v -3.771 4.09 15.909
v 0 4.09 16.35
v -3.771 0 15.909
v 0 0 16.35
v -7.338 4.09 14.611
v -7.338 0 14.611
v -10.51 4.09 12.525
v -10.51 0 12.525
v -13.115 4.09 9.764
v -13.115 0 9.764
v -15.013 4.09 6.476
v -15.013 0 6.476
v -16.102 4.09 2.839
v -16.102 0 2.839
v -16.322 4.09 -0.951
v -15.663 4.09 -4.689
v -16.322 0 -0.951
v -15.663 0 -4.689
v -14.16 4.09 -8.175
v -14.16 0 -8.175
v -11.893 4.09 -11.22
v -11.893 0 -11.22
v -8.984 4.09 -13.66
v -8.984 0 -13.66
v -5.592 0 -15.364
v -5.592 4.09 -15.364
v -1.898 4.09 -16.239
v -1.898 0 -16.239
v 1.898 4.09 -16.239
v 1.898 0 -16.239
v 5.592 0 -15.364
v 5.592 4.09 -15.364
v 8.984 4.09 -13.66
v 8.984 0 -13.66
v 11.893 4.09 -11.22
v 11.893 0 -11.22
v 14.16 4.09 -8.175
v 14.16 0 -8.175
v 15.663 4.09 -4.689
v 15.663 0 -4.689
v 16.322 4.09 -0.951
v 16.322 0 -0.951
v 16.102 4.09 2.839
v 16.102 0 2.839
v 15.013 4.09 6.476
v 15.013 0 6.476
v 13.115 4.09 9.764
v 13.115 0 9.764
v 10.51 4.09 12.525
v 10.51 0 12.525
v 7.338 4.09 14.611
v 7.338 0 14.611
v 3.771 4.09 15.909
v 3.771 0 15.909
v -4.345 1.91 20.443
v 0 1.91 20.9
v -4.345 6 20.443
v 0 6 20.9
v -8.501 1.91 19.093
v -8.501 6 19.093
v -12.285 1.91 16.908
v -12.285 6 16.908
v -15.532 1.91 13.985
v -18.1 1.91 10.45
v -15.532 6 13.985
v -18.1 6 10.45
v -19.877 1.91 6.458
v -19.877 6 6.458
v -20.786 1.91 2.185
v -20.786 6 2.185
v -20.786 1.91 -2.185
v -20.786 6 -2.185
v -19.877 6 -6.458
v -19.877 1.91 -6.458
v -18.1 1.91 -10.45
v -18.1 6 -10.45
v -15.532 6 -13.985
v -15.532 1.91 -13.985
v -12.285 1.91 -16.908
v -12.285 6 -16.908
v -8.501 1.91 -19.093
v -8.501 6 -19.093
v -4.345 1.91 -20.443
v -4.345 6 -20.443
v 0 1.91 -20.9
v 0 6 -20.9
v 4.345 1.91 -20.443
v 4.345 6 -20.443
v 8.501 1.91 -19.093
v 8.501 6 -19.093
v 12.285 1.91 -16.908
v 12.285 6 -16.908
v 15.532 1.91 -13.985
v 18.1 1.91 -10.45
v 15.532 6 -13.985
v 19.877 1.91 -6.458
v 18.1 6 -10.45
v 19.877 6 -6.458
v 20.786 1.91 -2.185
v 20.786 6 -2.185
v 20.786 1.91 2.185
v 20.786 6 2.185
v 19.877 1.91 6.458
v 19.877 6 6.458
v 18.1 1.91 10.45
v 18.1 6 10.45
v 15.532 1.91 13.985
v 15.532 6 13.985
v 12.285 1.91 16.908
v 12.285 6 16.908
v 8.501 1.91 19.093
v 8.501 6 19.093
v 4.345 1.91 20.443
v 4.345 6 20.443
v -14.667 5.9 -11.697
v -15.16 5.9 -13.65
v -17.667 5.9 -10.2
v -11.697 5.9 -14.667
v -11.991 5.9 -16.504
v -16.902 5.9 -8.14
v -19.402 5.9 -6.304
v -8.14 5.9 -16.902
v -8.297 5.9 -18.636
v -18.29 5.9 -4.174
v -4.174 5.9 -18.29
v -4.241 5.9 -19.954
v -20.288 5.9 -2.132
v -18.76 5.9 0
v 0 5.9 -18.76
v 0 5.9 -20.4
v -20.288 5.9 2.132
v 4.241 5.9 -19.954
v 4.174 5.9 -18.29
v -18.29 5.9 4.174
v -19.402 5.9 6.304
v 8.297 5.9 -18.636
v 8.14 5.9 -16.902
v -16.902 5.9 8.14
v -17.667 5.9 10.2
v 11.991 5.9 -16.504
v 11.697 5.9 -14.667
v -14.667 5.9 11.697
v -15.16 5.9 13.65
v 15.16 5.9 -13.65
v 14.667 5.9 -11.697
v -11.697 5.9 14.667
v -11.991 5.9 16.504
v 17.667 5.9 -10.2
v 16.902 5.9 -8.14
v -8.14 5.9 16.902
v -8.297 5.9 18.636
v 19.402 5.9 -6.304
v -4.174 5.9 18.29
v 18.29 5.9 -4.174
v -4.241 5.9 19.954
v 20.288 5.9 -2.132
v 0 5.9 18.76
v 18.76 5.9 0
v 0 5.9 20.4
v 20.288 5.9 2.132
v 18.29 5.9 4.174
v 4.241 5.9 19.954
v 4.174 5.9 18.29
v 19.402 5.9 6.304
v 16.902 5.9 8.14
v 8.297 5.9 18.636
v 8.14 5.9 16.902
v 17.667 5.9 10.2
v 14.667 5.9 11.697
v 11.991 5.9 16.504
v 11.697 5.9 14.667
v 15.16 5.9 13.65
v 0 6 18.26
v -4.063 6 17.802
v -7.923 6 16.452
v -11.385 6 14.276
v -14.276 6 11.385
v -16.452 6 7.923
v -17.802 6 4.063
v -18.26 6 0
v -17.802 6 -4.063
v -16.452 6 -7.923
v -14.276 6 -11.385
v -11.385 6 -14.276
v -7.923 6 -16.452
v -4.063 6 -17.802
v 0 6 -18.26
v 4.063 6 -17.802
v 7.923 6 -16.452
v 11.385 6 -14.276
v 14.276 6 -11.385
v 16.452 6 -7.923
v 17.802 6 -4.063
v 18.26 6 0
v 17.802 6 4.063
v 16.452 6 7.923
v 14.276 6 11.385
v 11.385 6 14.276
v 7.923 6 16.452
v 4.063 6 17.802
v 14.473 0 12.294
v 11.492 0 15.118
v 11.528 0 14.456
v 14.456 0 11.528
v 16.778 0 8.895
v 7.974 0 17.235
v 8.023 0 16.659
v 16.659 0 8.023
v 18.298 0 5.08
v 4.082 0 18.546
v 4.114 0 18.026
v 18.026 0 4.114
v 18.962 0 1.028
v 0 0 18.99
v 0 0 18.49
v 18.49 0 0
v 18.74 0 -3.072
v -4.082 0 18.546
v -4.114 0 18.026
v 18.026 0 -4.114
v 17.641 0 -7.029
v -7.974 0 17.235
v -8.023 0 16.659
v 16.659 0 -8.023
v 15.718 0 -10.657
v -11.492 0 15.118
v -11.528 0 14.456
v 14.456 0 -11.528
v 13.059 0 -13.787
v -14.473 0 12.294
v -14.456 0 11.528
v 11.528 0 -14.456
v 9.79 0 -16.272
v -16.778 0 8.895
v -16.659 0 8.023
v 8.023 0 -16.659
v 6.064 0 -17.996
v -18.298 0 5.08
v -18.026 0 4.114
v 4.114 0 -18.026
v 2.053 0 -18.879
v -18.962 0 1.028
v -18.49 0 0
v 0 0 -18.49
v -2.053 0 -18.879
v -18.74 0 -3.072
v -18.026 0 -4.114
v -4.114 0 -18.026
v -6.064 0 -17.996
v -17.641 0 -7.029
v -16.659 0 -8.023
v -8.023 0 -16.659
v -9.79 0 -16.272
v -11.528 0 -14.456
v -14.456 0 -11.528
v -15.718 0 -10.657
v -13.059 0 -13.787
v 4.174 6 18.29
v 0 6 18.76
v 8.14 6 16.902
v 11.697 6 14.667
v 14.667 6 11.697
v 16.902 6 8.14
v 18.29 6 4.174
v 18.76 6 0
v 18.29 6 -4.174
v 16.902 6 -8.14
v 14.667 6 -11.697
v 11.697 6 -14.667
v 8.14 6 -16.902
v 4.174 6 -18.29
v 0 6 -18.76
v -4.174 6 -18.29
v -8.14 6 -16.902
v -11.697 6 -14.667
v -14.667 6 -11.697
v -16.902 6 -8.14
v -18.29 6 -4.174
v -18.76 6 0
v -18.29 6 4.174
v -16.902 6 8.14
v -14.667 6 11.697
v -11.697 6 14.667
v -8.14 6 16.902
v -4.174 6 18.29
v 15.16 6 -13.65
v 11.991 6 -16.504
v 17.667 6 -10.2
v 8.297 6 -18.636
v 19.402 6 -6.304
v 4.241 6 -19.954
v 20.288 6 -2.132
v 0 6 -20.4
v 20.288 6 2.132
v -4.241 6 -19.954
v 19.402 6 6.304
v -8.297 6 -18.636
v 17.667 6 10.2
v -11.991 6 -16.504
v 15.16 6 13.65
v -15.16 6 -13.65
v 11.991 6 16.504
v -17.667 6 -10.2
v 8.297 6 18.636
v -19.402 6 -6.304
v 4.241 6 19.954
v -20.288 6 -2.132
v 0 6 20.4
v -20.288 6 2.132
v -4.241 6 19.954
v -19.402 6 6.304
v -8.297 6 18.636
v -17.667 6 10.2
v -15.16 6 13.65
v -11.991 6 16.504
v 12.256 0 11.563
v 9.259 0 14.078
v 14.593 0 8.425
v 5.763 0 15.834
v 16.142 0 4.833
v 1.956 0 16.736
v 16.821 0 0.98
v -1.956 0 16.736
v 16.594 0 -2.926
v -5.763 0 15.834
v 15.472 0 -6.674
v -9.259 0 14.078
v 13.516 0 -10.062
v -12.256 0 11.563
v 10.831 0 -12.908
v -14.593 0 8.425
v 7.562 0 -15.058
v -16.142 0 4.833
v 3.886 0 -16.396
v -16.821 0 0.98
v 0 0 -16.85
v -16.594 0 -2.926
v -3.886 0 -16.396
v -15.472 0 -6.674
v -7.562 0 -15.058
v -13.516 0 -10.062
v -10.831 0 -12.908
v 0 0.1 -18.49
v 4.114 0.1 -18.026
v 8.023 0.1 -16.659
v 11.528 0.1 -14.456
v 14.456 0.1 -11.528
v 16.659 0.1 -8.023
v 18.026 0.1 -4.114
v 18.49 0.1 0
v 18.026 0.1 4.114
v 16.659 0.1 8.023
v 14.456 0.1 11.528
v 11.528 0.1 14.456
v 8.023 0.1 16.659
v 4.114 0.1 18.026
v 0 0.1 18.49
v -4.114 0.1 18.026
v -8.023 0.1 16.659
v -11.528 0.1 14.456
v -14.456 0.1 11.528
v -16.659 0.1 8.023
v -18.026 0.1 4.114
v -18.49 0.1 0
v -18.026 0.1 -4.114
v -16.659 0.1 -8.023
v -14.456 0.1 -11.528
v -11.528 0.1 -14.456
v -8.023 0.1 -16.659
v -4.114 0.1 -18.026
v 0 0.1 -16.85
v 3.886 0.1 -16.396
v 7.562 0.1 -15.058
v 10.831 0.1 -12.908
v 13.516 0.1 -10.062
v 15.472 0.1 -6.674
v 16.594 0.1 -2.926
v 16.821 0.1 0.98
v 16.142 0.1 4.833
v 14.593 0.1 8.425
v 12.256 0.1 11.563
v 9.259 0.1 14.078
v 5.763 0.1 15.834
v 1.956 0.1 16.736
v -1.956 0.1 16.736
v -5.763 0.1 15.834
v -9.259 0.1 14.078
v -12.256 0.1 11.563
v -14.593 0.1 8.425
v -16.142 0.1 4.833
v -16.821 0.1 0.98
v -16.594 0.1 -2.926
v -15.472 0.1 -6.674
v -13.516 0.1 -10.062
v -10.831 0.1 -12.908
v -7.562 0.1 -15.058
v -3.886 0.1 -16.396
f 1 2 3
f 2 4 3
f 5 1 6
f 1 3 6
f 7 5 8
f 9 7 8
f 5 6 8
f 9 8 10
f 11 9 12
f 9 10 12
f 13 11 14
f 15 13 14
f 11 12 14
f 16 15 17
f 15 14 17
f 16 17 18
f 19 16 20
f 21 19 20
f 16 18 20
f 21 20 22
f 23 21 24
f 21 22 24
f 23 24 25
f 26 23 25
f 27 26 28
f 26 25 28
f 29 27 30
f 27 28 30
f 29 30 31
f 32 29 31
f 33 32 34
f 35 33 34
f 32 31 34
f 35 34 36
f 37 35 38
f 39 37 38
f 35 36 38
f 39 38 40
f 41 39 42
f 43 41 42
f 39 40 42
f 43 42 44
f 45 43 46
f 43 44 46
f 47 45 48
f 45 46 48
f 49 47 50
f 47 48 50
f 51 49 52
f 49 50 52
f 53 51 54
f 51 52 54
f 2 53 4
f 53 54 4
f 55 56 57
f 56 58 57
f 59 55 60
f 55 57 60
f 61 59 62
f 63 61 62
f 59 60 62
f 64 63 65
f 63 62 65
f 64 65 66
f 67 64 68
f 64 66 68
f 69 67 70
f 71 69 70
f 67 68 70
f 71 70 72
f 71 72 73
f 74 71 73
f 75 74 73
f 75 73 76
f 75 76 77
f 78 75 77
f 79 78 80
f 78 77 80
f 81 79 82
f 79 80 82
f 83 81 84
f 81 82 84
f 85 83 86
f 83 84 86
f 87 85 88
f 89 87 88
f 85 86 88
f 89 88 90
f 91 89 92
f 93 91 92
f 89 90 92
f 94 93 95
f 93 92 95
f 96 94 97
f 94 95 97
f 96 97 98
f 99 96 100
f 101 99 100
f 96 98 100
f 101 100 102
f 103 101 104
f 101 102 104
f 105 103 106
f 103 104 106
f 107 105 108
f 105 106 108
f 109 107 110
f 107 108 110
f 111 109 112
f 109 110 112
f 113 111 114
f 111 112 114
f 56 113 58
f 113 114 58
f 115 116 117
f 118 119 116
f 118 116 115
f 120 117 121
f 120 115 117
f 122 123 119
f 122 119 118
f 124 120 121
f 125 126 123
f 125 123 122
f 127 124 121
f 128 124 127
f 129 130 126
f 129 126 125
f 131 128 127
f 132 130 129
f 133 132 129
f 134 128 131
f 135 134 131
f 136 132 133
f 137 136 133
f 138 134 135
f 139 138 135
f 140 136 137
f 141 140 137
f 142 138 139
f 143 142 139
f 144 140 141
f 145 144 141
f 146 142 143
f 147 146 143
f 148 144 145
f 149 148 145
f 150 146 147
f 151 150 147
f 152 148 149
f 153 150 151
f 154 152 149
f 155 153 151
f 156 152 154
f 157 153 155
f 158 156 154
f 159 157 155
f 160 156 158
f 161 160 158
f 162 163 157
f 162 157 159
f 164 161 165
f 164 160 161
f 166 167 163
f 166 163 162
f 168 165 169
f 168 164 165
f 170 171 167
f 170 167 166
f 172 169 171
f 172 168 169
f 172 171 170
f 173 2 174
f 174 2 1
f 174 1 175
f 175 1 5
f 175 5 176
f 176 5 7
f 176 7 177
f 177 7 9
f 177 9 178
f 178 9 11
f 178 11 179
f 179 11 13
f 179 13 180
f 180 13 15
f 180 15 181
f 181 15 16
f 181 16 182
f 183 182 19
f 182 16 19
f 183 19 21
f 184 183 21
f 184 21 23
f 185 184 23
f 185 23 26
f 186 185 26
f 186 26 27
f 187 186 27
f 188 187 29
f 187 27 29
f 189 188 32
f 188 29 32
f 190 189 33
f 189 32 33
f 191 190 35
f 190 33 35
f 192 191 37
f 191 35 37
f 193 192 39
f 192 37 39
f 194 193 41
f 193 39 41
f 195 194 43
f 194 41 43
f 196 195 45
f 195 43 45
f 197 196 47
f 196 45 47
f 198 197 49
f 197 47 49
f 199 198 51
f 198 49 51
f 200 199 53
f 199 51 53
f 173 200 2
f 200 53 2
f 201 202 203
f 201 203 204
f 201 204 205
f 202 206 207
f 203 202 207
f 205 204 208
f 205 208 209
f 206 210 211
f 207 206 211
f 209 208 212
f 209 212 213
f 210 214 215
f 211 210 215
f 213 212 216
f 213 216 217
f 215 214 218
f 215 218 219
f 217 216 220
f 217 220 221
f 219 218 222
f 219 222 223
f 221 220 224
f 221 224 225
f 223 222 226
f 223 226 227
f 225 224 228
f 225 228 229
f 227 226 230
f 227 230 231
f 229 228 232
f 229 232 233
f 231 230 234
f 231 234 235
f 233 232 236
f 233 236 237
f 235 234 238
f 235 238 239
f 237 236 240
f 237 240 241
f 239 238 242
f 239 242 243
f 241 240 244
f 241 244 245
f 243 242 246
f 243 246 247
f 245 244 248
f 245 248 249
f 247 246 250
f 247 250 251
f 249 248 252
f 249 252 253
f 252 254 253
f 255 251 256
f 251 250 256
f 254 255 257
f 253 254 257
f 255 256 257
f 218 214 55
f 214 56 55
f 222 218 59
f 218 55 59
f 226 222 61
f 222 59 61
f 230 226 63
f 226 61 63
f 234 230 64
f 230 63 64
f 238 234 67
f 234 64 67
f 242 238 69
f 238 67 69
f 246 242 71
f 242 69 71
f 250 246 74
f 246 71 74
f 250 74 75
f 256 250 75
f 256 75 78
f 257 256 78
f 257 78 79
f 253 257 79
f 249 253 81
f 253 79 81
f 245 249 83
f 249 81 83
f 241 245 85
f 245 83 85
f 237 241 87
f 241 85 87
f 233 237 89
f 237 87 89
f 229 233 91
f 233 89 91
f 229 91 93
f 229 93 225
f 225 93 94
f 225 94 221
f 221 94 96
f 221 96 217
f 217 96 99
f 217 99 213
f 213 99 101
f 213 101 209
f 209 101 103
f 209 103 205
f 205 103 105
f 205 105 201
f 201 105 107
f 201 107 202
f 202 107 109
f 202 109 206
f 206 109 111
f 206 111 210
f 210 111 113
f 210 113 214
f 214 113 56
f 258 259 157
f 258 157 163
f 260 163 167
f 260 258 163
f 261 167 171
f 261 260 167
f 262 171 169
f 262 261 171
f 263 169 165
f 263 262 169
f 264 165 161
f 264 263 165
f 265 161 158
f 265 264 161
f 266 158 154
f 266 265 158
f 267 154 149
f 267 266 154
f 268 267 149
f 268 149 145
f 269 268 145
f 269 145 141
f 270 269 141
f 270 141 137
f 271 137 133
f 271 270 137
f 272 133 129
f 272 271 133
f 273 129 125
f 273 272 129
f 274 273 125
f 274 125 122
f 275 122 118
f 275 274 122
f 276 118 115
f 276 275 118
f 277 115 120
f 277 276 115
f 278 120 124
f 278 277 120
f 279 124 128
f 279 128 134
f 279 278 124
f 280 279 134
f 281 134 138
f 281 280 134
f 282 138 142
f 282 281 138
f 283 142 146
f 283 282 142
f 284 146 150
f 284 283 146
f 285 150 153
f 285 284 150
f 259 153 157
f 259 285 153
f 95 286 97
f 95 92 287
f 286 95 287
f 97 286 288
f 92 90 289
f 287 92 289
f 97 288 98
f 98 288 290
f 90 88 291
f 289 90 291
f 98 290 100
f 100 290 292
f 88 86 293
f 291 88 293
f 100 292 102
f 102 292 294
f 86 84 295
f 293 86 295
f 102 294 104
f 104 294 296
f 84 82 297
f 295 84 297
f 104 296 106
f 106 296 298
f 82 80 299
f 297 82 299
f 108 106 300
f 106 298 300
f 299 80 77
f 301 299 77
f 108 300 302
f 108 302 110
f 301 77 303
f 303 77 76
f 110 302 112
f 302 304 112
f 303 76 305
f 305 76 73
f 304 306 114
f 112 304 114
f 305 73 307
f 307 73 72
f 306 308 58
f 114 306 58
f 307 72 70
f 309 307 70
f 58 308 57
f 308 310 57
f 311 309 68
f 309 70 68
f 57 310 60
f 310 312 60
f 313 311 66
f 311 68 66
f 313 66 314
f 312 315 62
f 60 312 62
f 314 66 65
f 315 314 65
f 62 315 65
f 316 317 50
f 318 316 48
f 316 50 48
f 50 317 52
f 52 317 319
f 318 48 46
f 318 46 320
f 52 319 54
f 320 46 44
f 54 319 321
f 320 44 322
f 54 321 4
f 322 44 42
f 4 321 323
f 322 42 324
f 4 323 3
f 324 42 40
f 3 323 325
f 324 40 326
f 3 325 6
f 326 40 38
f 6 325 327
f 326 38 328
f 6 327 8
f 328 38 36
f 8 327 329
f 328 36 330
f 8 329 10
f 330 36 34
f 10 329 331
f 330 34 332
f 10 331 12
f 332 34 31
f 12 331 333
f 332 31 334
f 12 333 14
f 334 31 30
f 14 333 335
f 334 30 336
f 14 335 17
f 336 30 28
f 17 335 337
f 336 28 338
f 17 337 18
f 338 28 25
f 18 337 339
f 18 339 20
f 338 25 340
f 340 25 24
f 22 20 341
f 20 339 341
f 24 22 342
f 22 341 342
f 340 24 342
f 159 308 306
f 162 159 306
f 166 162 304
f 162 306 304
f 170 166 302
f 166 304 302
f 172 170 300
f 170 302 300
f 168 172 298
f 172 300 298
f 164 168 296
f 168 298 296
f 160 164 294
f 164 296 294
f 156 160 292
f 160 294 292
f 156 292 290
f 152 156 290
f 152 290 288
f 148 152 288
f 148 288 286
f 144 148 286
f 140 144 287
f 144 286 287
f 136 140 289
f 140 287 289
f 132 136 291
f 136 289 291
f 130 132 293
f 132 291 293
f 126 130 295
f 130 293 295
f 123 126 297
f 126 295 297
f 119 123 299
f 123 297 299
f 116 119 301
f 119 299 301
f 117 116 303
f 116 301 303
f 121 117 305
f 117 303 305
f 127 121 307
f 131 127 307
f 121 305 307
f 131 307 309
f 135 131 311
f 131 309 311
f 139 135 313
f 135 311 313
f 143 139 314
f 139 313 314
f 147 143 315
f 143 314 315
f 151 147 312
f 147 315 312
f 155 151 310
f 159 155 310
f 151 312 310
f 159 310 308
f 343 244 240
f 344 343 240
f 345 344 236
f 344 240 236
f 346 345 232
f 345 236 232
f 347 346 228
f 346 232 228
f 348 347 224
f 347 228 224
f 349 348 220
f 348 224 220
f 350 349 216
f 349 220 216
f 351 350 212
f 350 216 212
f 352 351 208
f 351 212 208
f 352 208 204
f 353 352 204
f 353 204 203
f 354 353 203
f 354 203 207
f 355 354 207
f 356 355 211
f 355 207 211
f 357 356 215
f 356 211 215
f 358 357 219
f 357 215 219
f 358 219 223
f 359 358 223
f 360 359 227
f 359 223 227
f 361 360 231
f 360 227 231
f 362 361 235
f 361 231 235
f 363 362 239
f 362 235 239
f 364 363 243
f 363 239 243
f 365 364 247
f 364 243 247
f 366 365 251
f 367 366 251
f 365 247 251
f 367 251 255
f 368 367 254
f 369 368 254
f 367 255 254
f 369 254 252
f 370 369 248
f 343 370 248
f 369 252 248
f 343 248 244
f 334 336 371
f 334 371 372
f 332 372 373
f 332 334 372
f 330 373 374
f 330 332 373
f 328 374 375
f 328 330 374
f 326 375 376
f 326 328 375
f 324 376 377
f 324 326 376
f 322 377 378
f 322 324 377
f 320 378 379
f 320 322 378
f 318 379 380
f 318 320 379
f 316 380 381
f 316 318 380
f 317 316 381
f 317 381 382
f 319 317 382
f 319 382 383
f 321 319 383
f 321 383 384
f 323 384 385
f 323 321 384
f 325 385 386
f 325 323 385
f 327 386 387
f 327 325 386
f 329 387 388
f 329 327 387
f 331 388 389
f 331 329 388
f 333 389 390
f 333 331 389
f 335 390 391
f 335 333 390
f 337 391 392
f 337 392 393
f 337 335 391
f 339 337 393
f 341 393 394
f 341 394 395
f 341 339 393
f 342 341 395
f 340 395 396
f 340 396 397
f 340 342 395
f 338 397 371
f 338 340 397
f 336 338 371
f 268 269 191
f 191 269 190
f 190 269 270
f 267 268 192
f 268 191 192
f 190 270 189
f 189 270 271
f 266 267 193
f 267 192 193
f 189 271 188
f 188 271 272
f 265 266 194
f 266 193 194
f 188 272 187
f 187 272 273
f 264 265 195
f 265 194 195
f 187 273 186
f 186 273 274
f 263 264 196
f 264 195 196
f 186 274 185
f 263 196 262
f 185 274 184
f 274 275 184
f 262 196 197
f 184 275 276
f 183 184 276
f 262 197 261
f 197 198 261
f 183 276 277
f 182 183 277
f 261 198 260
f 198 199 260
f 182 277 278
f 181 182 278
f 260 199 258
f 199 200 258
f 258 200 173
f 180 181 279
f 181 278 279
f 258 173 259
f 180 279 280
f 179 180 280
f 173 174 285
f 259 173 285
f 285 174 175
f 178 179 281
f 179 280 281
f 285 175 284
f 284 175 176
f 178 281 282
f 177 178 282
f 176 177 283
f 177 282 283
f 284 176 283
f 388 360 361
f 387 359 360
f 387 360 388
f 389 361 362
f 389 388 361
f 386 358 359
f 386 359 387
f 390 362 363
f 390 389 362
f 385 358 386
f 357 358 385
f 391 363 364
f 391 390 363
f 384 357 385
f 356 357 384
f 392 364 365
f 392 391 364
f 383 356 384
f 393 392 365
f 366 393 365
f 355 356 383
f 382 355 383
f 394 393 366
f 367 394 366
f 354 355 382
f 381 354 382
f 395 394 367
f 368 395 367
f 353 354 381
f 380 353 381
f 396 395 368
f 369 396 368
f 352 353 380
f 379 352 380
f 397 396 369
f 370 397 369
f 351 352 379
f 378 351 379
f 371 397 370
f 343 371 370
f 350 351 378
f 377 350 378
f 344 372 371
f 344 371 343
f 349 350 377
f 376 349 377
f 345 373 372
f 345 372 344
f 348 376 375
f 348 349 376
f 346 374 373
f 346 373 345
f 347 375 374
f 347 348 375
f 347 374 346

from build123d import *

# Parameters (mm, degrees)
SKETCH_3_R          = 20.4
SKETCH_3_R_2        = 18.76
CUT_EXTRUDE_1_DEPTH = 0.1
SKETCH_4_R          = 18.49
SKETCH_4_R_2        = 16.85
CUT_EXTRUDE_2_DEPTH = 0.1


with BuildPart() as part:
    # 草图2 → 旋转1 (revolve)
    with BuildSketch(Plane(origin=(0, 0, 0), x_dir=(0, 0, -1), z_dir=(1, 0, 0))):
        Polygon((-20.9, 1.91), (-20.9, 6), (-18.26, 6), (-16.35, 4.09), (-16.35, 0), (-18.99, 0), align=None)
    revolve(axis=Axis((0, 0, 0), (0, -1, 0)))

    # 草图3 → 切除-拉伸1 (cut)
    with BuildSketch(Plane(origin=(0, 6, 0), x_dir=(1, 0, 0), z_dir=(0, 1, 0))):
        with Locations(Location((0, 0, 0), (0, 0, 270))):
            Circle(SKETCH_3_R)
        with Locations(Location((0, 0, 0), (0, 0, 270))):
            Circle(SKETCH_3_R_2, mode=Mode.SUBTRACT)
    extrude(amount=-CUT_EXTRUDE_1_DEPTH, mode=Mode.SUBTRACT)

    # 草图4 → 切除-拉伸2 (cut)
    with BuildSketch(Plane.XZ):
        with Locations(Location((0, 0, 0), (0, 0, 270))):
            Circle(SKETCH_4_R)
        with Locations(Location((0, 0, 0), (0, 0, 270))):
            Circle(SKETCH_4_R_2, mode=Mode.SUBTRACT)
    extrude(amount=-CUT_EXTRUDE_2_DEPTH, mode=Mode.SUBTRACT)


solid = part.part
